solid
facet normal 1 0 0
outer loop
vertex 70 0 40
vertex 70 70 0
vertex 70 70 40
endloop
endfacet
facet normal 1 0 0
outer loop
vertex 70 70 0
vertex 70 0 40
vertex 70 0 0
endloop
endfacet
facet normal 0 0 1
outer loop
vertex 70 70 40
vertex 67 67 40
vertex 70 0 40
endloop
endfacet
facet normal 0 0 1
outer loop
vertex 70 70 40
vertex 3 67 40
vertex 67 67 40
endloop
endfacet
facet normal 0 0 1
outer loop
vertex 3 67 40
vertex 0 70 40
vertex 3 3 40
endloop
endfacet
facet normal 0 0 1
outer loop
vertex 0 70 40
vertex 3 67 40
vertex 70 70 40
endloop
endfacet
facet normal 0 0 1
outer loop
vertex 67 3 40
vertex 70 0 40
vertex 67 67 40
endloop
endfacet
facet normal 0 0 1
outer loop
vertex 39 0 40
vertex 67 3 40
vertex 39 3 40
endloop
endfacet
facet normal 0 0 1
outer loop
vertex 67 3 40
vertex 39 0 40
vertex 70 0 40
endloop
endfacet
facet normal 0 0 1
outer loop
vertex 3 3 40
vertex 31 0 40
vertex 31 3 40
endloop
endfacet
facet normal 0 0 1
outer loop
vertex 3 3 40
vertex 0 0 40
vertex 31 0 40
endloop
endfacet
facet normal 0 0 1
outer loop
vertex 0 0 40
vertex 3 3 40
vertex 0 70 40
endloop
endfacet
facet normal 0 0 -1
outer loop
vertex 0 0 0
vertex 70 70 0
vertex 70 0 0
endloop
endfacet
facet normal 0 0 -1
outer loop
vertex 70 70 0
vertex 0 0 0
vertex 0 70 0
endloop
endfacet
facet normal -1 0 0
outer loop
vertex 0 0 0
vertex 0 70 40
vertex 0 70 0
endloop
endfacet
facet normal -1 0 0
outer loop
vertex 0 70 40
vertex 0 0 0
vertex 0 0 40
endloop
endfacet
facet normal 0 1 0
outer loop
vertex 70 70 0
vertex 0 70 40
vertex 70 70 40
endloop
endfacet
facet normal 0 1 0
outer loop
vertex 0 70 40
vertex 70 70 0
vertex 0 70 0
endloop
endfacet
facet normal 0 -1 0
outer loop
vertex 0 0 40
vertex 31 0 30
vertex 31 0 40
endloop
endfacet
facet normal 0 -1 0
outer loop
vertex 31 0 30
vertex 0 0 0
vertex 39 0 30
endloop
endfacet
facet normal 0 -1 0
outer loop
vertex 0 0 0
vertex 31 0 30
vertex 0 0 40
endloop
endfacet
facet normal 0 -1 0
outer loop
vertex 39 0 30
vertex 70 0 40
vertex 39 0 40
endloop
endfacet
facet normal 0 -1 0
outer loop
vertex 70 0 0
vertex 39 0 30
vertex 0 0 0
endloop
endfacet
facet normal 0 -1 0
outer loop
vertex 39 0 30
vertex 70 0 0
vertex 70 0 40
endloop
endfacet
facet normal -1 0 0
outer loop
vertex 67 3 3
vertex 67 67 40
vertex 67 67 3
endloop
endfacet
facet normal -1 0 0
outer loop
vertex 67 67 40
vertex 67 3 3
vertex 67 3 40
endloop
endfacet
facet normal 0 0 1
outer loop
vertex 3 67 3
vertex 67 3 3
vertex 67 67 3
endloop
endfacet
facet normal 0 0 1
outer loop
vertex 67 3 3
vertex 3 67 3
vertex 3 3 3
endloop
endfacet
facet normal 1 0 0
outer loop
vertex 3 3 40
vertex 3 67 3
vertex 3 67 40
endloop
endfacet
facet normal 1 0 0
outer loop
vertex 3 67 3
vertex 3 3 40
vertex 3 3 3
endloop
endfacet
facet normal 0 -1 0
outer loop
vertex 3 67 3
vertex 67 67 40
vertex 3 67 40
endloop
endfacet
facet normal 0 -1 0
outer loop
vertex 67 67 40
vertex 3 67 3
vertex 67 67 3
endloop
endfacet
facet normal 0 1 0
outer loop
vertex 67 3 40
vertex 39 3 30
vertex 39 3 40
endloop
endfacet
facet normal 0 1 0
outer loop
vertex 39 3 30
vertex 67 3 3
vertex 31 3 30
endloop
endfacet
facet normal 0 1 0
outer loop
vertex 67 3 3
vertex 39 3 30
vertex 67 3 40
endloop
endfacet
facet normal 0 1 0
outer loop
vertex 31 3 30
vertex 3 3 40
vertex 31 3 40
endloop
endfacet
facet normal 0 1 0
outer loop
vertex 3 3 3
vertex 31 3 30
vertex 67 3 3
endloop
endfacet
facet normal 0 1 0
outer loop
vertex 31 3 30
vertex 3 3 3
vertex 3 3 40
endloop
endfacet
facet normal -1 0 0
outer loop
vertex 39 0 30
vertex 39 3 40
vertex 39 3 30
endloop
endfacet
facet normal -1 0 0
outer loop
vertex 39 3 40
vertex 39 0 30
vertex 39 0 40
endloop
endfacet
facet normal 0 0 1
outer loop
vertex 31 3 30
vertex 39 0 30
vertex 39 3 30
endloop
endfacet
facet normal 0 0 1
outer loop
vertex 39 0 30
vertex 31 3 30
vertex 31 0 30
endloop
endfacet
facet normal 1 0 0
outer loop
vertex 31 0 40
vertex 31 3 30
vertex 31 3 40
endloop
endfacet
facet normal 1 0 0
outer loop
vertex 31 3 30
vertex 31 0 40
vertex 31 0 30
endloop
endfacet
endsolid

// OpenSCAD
$fn = 32;

// ----------------------------------------------------------------------
// Enclosure box: notch enclosure
// ----------------------------------------------------------------------

// --- parameters (mm) ---
box_l = 70;               // outer length, X
box_w = 70;               // outer width, Y
box_h = 40;               // outer height
wall_t = 3;               // wall thickness
notch_w = 8;              // cable notch width
notch_h = 10;             // cable notch height
fit_tol = 0.1;            // tolerance for press fits, mm
free_tol = 0.5;           // tolerance for clearance fits, mm

inner_h = box_h - wall_t;  // cavity depth
boss_h = inner_h - 2;  // corner boss height

difference() {
  union() {
    difference() {
      cube([box_l, box_w, box_h]);
      translate([wall_t, wall_t, wall_t])
        cube([box_l - 2 * wall_t, box_w - 2 * wall_t, box_h]);
    }
  }
  translate([box_l / 2 - notch_w / 2, -1, box_h - notch_h])
    cube([notch_w, wall_t + 2, notch_h + 1]);
}
